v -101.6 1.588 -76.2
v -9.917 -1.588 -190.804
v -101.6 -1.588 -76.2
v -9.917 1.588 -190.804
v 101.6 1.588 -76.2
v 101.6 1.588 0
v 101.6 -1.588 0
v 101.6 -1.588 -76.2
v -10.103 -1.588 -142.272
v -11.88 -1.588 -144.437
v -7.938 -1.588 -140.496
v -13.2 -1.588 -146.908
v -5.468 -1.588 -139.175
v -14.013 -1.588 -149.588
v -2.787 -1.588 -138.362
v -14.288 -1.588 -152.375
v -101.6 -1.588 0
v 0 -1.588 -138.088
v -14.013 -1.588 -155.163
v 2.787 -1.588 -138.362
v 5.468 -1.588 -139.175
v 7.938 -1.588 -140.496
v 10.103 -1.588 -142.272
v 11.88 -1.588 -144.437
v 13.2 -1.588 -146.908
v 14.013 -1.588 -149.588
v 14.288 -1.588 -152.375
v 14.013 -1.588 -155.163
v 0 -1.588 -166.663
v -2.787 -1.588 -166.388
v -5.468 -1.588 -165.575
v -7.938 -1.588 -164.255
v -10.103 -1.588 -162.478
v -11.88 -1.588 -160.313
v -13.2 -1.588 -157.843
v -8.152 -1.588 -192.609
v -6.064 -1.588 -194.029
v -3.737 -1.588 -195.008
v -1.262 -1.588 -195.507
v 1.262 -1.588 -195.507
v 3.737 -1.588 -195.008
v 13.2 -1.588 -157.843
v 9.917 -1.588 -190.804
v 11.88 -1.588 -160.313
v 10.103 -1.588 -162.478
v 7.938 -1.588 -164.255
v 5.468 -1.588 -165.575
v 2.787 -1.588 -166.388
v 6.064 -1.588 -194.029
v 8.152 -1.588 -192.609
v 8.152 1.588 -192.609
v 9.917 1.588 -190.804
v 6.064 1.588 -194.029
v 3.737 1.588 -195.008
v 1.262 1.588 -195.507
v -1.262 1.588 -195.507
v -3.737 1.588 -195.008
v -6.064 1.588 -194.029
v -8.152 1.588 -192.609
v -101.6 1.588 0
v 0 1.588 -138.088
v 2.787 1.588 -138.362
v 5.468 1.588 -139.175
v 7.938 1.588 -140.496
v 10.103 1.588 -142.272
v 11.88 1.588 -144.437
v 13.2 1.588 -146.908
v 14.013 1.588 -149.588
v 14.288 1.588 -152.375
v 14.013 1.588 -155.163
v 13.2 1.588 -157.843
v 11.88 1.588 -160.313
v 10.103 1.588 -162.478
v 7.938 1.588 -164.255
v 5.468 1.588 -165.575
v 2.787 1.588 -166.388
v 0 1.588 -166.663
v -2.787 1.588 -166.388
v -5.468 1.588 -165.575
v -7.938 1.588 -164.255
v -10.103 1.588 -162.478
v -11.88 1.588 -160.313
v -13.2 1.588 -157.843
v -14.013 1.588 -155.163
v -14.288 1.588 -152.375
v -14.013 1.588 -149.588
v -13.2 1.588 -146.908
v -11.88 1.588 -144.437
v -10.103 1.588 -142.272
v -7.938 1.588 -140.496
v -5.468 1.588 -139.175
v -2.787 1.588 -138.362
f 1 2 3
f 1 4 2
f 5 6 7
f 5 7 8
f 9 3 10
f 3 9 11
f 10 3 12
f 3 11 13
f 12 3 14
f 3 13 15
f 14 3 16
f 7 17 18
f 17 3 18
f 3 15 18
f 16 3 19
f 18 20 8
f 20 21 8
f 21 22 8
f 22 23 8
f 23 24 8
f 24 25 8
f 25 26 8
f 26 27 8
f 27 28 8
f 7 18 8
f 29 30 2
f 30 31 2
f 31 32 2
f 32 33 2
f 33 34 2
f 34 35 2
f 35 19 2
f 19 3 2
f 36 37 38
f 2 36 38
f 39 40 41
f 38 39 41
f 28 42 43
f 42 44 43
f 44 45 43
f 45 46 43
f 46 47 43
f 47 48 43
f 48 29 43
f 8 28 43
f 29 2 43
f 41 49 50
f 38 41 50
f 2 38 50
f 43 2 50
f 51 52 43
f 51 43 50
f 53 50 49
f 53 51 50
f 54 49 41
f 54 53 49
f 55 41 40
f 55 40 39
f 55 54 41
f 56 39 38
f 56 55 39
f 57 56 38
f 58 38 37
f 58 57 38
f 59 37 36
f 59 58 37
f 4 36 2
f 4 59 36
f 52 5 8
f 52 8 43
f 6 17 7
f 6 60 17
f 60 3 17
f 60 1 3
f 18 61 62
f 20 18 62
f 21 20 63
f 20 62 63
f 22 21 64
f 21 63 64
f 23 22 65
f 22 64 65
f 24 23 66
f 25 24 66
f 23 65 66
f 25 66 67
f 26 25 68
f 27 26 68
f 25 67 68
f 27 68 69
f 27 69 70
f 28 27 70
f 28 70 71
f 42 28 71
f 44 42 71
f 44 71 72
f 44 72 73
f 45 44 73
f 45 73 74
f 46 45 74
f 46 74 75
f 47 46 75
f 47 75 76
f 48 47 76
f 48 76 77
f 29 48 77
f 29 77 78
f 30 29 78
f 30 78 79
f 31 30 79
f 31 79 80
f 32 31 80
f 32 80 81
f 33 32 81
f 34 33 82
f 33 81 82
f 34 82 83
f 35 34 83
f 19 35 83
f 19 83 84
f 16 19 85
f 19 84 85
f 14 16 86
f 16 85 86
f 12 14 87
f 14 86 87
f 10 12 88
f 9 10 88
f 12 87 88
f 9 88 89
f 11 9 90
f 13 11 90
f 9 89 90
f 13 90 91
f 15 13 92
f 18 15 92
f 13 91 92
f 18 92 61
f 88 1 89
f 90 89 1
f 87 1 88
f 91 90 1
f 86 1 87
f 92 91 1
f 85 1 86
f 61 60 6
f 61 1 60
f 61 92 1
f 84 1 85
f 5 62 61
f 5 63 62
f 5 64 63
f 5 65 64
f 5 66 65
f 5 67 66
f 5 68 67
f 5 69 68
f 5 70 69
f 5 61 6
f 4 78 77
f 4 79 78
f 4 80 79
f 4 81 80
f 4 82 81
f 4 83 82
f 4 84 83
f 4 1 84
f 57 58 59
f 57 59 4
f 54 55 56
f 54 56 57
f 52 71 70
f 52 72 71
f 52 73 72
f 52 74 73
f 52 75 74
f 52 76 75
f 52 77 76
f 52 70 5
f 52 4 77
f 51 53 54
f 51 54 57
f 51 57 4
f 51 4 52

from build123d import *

# Parameters (mm, degrees)
BOSS_EXTRUDE1_DEPTH = 1.5875
CUT_EXTRUDE1_REACH  = 222.409
SKETCH3_R           = 14.2875


with BuildPart() as part:
    # Sketch2 → Boss-Extrude1 (new, symmetric)
    with BuildSketch(Plane(origin=(0, 0, 0), x_dir=(1, 0, 0), z_dir=(0, 1, 0))):
        with BuildLine():
            Line((-101.6, 0), (101.6, 0))
            Line((101.6, 0), (101.6, 76.2))
            Line((101.6, 76.2), (9.91703388, 190.80370765))
            ThreePointArc((9.91703388, 190.80370765), (0, 195.570080546), (-9.91703388, 190.80370765))
            Line((-9.91703388, 190.80370765), (-101.6, 76.2))
            Line((-101.6, 76.2), (-101.6, 0))
        make_face()
    extrude(amount=BOSS_EXTRUDE1_DEPTH, both=True)

    # Sketch3 → Cut-Extrude1 (cut, up to next)
    with BuildSketch(Plane(origin=(0, 1.5875, 0), x_dir=(1, 0, 0), z_dir=(0, 1, 0)), mode=Mode.PRIVATE) as cut_extrude1_sk1:
        with Locations(Location((0, 152.375201365, 0), (0, 0, 270))):
            Circle(SKETCH3_R)
    cut_extrude1_tool1 = extrude(cut_extrude1_sk1.sketch, amount=-CUT_EXTRUDE1_REACH, mode=Mode.PRIVATE) & part.part
    add(cut_extrude1_tool1.solids().sort_by_distance((0, 1.5875, -152.375201))[0], mode=Mode.SUBTRACT)


solid = part.part
